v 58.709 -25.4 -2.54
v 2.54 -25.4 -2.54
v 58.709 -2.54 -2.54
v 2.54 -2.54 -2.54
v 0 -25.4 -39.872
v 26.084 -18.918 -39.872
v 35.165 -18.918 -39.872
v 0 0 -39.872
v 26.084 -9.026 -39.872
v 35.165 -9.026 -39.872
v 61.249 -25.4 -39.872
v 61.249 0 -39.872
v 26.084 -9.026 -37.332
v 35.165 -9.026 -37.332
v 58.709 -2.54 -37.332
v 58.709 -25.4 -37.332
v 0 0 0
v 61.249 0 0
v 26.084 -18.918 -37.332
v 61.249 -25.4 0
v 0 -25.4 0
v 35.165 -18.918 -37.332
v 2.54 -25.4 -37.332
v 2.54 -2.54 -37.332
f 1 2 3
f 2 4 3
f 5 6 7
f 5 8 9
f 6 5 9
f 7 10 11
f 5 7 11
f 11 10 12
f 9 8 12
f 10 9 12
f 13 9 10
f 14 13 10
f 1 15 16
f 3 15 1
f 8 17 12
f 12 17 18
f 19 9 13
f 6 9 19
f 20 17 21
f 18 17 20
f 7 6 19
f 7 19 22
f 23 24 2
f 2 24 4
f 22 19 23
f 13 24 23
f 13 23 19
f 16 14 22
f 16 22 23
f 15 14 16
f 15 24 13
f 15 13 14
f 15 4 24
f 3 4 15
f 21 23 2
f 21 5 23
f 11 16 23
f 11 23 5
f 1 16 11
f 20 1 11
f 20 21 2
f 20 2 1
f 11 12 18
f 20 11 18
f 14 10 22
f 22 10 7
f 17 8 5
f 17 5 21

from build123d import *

# Parameters (mm, degrees)
F0_W     = 61.248694
F0_H     = 39.8717
F1_DEPTH = 25.4
F2_T     = -2.54
F3_W     = 9.080695
F3_H     = 9.89195
F4_DEPTH = 25.4


with BuildPart() as f1:
    # F0 (on Front) → F1 (new body)
    with BuildSketch(Plane.XZ):
        with Locations((30.624347, -19.93585)):
            Rectangle(F0_W, F0_H)
    extrude(amount=F1_DEPTH)

    # F2
    f2_openings = [f1.faces().sort_by_distance(p)[0] for p in [
        (30.624347, -25.4, -19.93585),
    ]]
    offset(amount=F2_T, openings=f2_openings)

    # F3 (on face) → F4 (cut)
    with BuildSketch(Plane(origin=(0, 0, -39.8717), x_dir=(1, 0, 0), z_dir=(0, 0, -1))):
        with Locations((30.624346, 13.972152)):
            Rectangle(F3_W, F3_H)
    extrude(amount=-F4_DEPTH, mode=Mode.SUBTRACT)


solid = f1.part
